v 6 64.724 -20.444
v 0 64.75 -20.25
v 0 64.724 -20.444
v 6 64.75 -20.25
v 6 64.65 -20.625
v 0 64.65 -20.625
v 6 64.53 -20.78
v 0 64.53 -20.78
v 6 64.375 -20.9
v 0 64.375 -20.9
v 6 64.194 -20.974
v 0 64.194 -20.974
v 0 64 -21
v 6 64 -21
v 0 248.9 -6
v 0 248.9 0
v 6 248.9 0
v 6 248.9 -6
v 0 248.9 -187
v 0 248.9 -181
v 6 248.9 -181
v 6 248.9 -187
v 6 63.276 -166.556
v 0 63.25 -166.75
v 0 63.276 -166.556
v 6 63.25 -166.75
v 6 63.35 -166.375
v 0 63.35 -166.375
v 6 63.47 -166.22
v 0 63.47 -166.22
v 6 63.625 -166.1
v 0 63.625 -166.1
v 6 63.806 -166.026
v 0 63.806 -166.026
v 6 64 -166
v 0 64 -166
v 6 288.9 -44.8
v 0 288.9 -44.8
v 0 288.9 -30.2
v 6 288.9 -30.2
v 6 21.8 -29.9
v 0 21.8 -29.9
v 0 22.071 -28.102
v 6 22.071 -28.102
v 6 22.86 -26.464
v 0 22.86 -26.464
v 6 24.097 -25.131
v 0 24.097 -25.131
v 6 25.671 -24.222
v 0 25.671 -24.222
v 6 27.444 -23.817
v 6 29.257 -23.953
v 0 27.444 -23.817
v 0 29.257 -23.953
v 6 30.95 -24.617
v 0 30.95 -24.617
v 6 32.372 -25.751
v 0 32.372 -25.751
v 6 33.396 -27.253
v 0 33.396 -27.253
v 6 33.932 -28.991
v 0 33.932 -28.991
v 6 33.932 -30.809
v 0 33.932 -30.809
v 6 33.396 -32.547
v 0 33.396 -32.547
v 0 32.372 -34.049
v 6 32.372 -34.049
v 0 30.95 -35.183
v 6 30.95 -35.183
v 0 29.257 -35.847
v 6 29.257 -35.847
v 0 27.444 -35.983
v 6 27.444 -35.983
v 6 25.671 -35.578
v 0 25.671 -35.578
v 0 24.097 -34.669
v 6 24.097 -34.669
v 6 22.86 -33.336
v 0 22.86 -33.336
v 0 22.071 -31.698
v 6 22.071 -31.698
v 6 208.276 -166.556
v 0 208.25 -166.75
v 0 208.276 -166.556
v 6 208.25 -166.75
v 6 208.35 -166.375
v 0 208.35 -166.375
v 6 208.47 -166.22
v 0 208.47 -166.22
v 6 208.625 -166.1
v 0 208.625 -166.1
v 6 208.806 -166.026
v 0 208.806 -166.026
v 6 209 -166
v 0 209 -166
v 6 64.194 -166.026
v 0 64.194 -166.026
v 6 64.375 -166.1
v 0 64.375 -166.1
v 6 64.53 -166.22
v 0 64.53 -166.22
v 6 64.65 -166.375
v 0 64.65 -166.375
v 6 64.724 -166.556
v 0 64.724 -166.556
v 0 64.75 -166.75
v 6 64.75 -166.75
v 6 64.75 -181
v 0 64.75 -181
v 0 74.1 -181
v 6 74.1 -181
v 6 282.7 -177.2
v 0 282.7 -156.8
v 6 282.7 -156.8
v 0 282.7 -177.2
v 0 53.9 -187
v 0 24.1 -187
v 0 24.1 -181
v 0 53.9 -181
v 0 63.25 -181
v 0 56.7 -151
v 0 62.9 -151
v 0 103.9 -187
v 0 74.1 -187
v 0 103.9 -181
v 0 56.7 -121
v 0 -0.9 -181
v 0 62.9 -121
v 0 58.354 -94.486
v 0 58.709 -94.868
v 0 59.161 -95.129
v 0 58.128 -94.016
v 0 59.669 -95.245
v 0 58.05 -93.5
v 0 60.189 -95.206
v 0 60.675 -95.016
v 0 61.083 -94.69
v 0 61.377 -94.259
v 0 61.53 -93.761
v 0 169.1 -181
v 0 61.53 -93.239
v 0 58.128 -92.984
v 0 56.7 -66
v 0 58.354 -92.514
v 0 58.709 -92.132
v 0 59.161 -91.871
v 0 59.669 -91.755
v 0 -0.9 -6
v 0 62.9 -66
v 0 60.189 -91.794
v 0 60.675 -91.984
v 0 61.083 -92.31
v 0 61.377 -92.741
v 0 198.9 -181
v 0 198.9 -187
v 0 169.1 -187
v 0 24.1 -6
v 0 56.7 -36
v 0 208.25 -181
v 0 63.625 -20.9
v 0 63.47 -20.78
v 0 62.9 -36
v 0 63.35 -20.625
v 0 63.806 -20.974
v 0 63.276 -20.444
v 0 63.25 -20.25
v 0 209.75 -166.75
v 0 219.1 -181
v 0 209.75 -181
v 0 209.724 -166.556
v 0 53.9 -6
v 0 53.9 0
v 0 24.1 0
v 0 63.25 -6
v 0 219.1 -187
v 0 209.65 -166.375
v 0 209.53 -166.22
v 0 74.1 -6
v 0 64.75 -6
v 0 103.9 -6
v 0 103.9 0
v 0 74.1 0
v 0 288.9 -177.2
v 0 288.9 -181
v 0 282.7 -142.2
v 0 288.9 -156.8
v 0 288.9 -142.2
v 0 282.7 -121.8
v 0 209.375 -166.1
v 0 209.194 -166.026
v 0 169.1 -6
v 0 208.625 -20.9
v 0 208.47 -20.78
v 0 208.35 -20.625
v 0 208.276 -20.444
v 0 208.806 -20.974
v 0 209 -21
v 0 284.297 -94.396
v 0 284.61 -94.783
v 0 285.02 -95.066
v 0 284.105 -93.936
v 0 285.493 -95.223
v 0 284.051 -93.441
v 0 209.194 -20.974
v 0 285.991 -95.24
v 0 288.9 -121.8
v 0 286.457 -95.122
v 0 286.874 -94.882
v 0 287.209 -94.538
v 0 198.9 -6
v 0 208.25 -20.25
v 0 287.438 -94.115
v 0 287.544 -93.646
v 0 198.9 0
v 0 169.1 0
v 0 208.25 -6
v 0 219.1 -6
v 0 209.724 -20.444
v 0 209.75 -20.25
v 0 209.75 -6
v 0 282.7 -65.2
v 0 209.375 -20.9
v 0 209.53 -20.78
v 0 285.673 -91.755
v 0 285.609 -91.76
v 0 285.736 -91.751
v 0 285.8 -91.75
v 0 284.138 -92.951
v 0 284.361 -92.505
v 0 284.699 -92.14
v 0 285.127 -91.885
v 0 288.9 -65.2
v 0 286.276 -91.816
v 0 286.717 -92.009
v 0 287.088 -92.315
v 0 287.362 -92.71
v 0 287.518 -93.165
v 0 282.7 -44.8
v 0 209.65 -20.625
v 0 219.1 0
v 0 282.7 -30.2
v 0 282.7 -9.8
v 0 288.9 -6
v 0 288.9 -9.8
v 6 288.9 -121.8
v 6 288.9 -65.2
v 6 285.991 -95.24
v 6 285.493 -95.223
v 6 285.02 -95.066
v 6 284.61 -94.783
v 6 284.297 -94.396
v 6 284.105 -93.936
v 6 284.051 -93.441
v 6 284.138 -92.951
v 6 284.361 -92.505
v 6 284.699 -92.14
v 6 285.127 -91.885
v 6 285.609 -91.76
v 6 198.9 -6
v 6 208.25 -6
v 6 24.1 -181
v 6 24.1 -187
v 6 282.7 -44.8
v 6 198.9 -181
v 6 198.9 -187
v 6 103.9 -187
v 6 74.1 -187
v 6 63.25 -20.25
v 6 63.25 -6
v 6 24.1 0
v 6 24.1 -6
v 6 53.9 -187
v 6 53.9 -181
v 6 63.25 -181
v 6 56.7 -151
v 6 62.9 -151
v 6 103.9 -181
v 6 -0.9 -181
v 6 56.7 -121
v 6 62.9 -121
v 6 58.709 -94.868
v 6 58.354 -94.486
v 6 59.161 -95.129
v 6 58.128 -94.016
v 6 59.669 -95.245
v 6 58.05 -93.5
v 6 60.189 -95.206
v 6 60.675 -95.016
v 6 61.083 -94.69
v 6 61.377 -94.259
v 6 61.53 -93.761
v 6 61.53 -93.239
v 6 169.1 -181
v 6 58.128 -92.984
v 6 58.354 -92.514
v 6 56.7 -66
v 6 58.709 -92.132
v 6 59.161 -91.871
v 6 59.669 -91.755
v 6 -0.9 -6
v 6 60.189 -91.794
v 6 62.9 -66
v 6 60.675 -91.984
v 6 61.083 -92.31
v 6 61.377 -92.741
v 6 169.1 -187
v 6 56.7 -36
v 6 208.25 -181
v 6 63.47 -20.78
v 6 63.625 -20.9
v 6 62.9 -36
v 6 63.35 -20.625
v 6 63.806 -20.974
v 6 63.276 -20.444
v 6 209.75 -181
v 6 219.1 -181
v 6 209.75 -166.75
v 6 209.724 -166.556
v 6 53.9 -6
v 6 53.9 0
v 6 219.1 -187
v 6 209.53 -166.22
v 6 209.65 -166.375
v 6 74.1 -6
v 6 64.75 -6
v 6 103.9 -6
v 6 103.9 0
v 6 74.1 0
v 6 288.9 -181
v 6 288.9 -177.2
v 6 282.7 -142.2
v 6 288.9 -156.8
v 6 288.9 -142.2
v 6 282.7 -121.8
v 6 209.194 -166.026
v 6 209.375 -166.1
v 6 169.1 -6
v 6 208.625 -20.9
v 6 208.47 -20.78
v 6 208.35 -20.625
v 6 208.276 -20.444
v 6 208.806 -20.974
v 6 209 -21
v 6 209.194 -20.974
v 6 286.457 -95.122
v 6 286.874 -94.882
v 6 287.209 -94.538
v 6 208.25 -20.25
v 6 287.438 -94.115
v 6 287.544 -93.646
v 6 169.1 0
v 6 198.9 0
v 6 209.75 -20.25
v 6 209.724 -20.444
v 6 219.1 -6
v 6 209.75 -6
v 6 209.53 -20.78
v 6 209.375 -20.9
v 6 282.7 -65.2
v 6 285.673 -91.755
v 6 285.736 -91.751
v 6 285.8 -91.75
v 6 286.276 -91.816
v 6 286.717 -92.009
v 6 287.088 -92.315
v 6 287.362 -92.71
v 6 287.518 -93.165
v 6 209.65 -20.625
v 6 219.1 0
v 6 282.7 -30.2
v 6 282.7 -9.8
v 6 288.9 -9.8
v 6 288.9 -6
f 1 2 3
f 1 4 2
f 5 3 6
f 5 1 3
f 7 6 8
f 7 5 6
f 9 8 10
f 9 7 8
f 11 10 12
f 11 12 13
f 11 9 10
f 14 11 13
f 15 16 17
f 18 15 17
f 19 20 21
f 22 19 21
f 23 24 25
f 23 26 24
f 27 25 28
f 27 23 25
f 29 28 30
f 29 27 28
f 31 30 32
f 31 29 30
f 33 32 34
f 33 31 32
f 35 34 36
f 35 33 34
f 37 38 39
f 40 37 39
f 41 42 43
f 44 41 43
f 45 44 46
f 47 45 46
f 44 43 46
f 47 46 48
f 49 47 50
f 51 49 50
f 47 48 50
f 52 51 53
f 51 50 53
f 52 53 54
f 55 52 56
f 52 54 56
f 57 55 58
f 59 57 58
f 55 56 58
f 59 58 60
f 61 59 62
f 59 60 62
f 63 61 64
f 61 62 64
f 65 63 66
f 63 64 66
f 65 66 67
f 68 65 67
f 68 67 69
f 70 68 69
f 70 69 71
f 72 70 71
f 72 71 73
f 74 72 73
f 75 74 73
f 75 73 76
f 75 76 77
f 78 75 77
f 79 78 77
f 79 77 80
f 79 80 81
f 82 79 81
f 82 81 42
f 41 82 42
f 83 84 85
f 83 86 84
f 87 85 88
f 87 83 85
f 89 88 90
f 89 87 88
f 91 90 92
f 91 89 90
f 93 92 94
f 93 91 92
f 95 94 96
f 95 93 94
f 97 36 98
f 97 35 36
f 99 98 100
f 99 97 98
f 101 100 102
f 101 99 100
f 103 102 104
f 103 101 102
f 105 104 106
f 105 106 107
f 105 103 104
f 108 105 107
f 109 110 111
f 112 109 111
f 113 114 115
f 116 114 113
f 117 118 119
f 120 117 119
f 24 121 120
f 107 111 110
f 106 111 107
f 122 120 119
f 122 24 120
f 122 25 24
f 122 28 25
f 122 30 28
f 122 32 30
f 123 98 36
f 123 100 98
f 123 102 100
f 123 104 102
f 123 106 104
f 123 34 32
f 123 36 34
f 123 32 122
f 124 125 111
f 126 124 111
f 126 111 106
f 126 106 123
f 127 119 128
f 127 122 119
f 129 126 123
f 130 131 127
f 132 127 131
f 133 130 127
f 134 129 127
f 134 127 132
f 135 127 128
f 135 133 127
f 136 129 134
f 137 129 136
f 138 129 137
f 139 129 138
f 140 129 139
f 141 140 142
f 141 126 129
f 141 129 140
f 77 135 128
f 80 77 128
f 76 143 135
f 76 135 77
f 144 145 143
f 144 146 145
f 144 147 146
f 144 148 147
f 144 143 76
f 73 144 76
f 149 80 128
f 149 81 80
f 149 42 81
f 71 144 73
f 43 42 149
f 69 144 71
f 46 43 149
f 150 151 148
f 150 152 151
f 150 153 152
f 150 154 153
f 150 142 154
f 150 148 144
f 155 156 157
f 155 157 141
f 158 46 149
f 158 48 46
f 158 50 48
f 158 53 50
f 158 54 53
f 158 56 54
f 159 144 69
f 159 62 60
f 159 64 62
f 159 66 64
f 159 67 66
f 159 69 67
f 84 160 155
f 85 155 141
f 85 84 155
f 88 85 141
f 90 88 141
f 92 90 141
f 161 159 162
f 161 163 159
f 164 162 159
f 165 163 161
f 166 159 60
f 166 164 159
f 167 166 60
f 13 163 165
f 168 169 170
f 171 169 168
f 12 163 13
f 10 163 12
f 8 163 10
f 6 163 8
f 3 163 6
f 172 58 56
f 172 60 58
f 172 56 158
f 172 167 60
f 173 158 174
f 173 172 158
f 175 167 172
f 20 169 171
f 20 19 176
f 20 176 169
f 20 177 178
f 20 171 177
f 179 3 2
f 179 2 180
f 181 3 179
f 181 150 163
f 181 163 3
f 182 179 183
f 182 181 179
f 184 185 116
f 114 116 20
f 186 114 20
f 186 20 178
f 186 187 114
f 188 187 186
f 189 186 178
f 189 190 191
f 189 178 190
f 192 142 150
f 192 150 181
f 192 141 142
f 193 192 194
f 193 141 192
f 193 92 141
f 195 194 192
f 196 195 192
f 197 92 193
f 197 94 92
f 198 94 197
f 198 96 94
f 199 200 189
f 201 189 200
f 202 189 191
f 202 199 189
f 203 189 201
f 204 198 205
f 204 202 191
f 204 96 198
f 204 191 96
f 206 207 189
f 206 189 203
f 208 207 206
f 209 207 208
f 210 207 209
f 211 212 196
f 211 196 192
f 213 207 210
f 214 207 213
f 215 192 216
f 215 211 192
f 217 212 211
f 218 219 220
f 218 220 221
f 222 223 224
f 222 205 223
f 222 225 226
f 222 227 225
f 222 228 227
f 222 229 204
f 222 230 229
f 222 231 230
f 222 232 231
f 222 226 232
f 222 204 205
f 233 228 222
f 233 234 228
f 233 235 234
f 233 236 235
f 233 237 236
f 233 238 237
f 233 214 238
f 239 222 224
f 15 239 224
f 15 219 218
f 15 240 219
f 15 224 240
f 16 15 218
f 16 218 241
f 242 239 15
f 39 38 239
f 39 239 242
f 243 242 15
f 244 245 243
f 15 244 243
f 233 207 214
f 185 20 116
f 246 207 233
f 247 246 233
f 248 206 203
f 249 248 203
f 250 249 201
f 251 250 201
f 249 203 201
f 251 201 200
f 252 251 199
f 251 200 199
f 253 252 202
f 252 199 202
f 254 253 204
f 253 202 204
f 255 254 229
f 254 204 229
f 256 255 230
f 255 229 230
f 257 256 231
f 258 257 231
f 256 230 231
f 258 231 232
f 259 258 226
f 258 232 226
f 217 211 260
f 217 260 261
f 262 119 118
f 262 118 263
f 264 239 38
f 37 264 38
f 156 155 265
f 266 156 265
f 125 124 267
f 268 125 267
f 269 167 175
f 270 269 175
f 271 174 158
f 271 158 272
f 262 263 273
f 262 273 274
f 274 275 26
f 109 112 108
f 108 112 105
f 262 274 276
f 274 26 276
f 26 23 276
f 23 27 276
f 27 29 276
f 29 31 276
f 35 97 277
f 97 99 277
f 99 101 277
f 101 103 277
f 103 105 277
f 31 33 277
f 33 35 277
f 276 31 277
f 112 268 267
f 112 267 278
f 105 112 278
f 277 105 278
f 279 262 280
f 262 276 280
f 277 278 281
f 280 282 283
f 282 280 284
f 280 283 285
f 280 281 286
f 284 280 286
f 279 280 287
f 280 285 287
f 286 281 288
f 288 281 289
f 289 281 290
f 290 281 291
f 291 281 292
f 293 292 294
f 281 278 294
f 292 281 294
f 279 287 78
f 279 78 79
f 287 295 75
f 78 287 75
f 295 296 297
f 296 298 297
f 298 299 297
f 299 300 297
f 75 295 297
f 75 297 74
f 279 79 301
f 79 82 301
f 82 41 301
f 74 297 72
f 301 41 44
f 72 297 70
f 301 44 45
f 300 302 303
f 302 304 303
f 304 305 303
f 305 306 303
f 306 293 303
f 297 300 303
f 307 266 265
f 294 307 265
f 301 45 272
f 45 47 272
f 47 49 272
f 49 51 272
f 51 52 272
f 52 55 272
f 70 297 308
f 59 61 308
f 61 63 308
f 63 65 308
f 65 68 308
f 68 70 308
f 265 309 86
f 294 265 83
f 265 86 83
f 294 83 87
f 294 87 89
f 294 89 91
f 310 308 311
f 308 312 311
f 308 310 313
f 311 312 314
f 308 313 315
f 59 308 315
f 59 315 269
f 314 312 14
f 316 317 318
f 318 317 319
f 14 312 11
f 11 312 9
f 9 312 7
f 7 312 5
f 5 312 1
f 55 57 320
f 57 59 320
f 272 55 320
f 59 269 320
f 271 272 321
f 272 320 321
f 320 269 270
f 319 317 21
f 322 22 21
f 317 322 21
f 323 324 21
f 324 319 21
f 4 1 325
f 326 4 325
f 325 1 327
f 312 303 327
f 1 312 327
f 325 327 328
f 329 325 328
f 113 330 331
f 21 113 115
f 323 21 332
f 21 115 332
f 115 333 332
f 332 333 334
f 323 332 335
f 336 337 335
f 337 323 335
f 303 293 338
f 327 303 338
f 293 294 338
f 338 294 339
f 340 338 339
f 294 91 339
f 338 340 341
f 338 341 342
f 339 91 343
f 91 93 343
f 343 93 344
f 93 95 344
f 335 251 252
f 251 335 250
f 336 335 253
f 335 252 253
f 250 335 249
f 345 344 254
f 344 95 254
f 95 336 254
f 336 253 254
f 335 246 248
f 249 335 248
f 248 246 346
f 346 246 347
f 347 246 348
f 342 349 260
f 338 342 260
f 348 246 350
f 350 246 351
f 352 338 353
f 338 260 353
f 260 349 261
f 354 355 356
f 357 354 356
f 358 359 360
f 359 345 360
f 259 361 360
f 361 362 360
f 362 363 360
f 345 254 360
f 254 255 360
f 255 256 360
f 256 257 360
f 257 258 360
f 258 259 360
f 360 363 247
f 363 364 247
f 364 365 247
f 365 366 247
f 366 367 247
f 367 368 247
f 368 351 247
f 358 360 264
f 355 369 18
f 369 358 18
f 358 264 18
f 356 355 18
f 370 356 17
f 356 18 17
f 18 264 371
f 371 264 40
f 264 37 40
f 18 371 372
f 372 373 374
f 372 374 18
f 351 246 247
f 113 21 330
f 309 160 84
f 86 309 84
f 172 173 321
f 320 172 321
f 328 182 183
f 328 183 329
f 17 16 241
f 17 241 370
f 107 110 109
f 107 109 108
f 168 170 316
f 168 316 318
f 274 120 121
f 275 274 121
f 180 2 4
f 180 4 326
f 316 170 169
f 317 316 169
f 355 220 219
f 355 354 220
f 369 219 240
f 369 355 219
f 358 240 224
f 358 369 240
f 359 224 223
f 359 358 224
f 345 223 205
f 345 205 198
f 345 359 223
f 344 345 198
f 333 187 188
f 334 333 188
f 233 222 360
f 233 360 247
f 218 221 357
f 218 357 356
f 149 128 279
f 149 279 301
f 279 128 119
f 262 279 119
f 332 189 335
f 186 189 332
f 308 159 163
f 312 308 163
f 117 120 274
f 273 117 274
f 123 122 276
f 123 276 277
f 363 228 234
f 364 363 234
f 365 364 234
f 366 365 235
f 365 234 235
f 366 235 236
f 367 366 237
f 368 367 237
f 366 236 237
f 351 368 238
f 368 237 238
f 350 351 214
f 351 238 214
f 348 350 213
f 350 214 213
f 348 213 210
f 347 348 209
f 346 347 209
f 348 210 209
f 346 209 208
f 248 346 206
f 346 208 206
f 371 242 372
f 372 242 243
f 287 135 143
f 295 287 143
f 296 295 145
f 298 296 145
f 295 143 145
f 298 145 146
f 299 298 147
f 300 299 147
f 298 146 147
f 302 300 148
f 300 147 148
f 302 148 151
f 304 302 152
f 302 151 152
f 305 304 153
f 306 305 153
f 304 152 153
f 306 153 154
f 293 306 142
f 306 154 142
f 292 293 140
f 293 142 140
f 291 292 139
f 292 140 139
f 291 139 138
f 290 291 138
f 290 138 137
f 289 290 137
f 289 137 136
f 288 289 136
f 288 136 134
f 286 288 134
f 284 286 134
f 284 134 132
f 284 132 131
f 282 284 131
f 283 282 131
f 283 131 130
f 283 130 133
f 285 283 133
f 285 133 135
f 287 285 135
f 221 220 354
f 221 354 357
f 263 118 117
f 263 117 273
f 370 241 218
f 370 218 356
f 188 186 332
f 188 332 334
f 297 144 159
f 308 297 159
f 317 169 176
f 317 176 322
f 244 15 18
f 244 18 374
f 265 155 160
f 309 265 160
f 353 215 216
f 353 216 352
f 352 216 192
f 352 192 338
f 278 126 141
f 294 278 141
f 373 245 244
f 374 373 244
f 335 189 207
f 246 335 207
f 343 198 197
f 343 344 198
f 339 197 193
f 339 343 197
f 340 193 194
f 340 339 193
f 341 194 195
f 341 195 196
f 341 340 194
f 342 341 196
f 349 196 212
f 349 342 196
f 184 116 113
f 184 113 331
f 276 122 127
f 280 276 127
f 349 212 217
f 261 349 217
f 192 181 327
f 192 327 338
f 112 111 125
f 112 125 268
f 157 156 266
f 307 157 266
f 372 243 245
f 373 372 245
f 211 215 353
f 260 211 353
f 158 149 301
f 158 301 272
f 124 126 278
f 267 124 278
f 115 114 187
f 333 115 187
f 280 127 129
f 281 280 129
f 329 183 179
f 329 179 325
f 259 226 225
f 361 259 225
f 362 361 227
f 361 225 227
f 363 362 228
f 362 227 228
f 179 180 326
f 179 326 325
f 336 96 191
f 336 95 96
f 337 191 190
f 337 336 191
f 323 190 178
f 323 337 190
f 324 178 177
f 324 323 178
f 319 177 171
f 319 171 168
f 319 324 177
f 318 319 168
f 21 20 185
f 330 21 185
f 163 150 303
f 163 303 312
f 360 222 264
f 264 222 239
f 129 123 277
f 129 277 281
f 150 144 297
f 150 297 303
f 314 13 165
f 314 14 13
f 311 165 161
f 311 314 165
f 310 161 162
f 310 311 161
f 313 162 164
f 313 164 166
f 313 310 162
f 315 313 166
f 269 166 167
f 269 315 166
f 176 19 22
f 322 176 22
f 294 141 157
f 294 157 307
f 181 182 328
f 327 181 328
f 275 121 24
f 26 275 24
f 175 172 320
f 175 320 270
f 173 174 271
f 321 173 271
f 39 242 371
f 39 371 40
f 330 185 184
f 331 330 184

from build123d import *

# Parameters (mm, degrees)
ESBO_O1_W                  = 6
ESBO_O1_H                  = 29.8
RESSALTO_EXTRUS_O3_DEPTH   = 187
RESSALTO_EXTRUS_O3_2_DEPTH = 187
RESSALTO_EXTRUS_O3_3_DEPTH = 187
RESSALTO_EXTRUS_O3_4_DEPTH = 187
ESBO_O2_W                  = 175
ESBO_O2_H                  = 289.8
RESSALTO_EXTRUS_O4_DEPTH   = 6
ESBO_O3_W                  = 15
ESBO_O3_H                  = 1.5
CORTE_EXTRUS_O1_DEPTH      = 6
ESBO_O5_R                  = 1.75
ESBO_O5_W                  = 30
ESBO_O5_H                  = 6.2
CORTE_EXTRUS_O3_DEPTH      = 22.8
ESBO_O6_W                  = 20.4
ESBO_O6_H                  = 6.2
CORTE_EXTRUS_O4_DEPTH      = 14.6
FILETE1_R                  = 0.75
CORTE_EXTRUS_O5_DEPTH      = 10
ESBO_O8_R                  = 6.1
CORTE_EXTRUS_O6_DEPTH      = 22


with BuildPart() as part:
    # Esboço1 → Ressalto-extrusão3 (new body)
    with BuildSketch(Plane.XY):
        with Locations((3, 39)):
            Rectangle(ESBO_O1_W, ESBO_O1_H)
    extrude(amount=-RESSALTO_EXTRUS_O3_DEPTH)



with BuildPart() as body_2:
    # Esboço1 → Ressalto-extrus_o3 2 (new body)
    with BuildSketch(Plane.XY):
        with Locations((3, 89)):
            Rectangle(ESBO_O1_W, ESBO_O1_H)
    extrude(amount=-RESSALTO_EXTRUS_O3_2_DEPTH)


with BuildPart() as body_3:
    # Esboço1 → Ressalto-extrus_o3 3 (new body)
    with BuildSketch(Plane.XY):
        with Locations((3, 184)):
            Rectangle(ESBO_O1_W, ESBO_O1_H)
    extrude(amount=-RESSALTO_EXTRUS_O3_3_DEPTH)


with BuildPart() as body_4:
    # Esboço1 → Ressalto-extrus_o3 4 (new body)
    with BuildSketch(Plane.XY):
        with Locations((3, 234)):
            Rectangle(ESBO_O1_W, ESBO_O1_H)
    extrude(amount=-RESSALTO_EXTRUS_O3_4_DEPTH)


with BuildPart() as part_1:
    add(part.part)

    add(body_2.part)  # Ressalto-extrusão4 merges body 2

    add(body_3.part)  # Ressalto-extrusão4 merges body 3

    add(body_4.part)  # Ressalto-extrusão4 merges body 4
    # Esboço2 → Ressalto-extrusão4 (add)
    with BuildSketch(Plane.ZY):
        with Locations((-93.5, 144)):
            Rectangle(ESBO_O2_W, ESBO_O2_H)
    extrude(amount=-RESSALTO_EXTRUS_O4_DEPTH)

    # Esboço3 → Corte-extrusão1 (cut)
    with BuildSketch(Plane.ZY):
        with Locations((-173.5, 64)):
            Rectangle(ESBO_O3_W, ESBO_O3_H)
        with Locations((-13.5, 64)):
            Rectangle(ESBO_O3_W, ESBO_O3_H)
        with Locations((-13.5, 209)):
            Rectangle(ESBO_O3_W, ESBO_O3_H)
        with Locations((-173.5, 209)):
            Rectangle(ESBO_O3_W, ESBO_O3_H)
    extrude(amount=-CORTE_EXTRUS_O1_DEPTH, mode=Mode.SUBTRACT)

    # Esboço5 → Corte-extrusão3 (cut)
    with BuildSketch(Plane.ZY):
        with Locations(Location((-93.5, 59.8, 0), (0, 0, 270))):
            Circle(ESBO_O5_R)
        with Locations((-136, 59.8)):
            Rectangle(ESBO_O5_W, ESBO_O5_H)
        with Locations((-51, 59.8)):
            Rectangle(ESBO_O5_W, ESBO_O5_H)
    extrude(amount=-CORTE_EXTRUS_O3_DEPTH, mode=Mode.SUBTRACT)

    # Esboço6 → Corte-extrusão4 (cut)
    with BuildSketch(Plane.ZY):
        with Locations((-20, 285.8)):
            Rectangle(ESBO_O6_W, ESBO_O6_H)
        with Locations((-55, 285.8)):
            Rectangle(ESBO_O6_W, ESBO_O6_H)
    corte_extrus_o4 = extrude(amount=-CORTE_EXTRUS_O4_DEPTH, mode=Mode.SUBTRACT)

    # Espelhar1: Corte-extrusão4 across plane
    add(corte_extrus_o4.mirror(Plane.XY.offset(-93.5)), mode=Mode.SUBTRACT)

    # Filete1
    filete1_edges = [part_1.edges().sort_by_distance(p)[0] for p in [
        (3, 64.75, -166),
        (3, 63.25, -166),
        (3, 63.25, -21),
        (3, 64.75, -21),
        (3, 208.25, -21),
        (3, 209.75, -21),
        (3, 208.25, -166),
        (3, 209.75, -166),
    ]]
    fillet(filete1_edges, radius=FILETE1_R - 0.0001)  # a hair under: the kernel refuses the full size

    # Esboço7 → Corte-extrusão5 (cut)
    with BuildSketch(Plane.ZY):
        with BuildLine():
            ThreePointArc((-91.75, 285.8), (-93.404579917, 287.547396637), (-95.239594295, 285.990556265))
            Line((-95.239594295, 285.990556265), (-91.760405705, 285.609443735))
            ThreePointArc((-91.760405705, 285.609443735), (-91.752603363, 285.704579917), (-91.75, 285.8))
        make_face()
        with BuildLine():
            Line((-91.760405705, 285.609443735), (-95.239594295, 285.990556265))
            ThreePointArc((-95.239594295, 285.990556265), (-93.690556265, 284.060405705), (-91.760405705, 285.609443735))
        make_face()
    extrude(amount=-CORTE_EXTRUS_O5_DEPTH, mode=Mode.SUBTRACT)

    # Esboço8 → Corte-extrusão6 (cut)
    with BuildSketch(Plane.ZY):
        with Locations(Location((-29.9, 27.9, 0), (0, 0, 270))):
            Circle(ESBO_O8_R)
    extrude(amount=-CORTE_EXTRUS_O6_DEPTH, mode=Mode.SUBTRACT)


solid = part_1.part
